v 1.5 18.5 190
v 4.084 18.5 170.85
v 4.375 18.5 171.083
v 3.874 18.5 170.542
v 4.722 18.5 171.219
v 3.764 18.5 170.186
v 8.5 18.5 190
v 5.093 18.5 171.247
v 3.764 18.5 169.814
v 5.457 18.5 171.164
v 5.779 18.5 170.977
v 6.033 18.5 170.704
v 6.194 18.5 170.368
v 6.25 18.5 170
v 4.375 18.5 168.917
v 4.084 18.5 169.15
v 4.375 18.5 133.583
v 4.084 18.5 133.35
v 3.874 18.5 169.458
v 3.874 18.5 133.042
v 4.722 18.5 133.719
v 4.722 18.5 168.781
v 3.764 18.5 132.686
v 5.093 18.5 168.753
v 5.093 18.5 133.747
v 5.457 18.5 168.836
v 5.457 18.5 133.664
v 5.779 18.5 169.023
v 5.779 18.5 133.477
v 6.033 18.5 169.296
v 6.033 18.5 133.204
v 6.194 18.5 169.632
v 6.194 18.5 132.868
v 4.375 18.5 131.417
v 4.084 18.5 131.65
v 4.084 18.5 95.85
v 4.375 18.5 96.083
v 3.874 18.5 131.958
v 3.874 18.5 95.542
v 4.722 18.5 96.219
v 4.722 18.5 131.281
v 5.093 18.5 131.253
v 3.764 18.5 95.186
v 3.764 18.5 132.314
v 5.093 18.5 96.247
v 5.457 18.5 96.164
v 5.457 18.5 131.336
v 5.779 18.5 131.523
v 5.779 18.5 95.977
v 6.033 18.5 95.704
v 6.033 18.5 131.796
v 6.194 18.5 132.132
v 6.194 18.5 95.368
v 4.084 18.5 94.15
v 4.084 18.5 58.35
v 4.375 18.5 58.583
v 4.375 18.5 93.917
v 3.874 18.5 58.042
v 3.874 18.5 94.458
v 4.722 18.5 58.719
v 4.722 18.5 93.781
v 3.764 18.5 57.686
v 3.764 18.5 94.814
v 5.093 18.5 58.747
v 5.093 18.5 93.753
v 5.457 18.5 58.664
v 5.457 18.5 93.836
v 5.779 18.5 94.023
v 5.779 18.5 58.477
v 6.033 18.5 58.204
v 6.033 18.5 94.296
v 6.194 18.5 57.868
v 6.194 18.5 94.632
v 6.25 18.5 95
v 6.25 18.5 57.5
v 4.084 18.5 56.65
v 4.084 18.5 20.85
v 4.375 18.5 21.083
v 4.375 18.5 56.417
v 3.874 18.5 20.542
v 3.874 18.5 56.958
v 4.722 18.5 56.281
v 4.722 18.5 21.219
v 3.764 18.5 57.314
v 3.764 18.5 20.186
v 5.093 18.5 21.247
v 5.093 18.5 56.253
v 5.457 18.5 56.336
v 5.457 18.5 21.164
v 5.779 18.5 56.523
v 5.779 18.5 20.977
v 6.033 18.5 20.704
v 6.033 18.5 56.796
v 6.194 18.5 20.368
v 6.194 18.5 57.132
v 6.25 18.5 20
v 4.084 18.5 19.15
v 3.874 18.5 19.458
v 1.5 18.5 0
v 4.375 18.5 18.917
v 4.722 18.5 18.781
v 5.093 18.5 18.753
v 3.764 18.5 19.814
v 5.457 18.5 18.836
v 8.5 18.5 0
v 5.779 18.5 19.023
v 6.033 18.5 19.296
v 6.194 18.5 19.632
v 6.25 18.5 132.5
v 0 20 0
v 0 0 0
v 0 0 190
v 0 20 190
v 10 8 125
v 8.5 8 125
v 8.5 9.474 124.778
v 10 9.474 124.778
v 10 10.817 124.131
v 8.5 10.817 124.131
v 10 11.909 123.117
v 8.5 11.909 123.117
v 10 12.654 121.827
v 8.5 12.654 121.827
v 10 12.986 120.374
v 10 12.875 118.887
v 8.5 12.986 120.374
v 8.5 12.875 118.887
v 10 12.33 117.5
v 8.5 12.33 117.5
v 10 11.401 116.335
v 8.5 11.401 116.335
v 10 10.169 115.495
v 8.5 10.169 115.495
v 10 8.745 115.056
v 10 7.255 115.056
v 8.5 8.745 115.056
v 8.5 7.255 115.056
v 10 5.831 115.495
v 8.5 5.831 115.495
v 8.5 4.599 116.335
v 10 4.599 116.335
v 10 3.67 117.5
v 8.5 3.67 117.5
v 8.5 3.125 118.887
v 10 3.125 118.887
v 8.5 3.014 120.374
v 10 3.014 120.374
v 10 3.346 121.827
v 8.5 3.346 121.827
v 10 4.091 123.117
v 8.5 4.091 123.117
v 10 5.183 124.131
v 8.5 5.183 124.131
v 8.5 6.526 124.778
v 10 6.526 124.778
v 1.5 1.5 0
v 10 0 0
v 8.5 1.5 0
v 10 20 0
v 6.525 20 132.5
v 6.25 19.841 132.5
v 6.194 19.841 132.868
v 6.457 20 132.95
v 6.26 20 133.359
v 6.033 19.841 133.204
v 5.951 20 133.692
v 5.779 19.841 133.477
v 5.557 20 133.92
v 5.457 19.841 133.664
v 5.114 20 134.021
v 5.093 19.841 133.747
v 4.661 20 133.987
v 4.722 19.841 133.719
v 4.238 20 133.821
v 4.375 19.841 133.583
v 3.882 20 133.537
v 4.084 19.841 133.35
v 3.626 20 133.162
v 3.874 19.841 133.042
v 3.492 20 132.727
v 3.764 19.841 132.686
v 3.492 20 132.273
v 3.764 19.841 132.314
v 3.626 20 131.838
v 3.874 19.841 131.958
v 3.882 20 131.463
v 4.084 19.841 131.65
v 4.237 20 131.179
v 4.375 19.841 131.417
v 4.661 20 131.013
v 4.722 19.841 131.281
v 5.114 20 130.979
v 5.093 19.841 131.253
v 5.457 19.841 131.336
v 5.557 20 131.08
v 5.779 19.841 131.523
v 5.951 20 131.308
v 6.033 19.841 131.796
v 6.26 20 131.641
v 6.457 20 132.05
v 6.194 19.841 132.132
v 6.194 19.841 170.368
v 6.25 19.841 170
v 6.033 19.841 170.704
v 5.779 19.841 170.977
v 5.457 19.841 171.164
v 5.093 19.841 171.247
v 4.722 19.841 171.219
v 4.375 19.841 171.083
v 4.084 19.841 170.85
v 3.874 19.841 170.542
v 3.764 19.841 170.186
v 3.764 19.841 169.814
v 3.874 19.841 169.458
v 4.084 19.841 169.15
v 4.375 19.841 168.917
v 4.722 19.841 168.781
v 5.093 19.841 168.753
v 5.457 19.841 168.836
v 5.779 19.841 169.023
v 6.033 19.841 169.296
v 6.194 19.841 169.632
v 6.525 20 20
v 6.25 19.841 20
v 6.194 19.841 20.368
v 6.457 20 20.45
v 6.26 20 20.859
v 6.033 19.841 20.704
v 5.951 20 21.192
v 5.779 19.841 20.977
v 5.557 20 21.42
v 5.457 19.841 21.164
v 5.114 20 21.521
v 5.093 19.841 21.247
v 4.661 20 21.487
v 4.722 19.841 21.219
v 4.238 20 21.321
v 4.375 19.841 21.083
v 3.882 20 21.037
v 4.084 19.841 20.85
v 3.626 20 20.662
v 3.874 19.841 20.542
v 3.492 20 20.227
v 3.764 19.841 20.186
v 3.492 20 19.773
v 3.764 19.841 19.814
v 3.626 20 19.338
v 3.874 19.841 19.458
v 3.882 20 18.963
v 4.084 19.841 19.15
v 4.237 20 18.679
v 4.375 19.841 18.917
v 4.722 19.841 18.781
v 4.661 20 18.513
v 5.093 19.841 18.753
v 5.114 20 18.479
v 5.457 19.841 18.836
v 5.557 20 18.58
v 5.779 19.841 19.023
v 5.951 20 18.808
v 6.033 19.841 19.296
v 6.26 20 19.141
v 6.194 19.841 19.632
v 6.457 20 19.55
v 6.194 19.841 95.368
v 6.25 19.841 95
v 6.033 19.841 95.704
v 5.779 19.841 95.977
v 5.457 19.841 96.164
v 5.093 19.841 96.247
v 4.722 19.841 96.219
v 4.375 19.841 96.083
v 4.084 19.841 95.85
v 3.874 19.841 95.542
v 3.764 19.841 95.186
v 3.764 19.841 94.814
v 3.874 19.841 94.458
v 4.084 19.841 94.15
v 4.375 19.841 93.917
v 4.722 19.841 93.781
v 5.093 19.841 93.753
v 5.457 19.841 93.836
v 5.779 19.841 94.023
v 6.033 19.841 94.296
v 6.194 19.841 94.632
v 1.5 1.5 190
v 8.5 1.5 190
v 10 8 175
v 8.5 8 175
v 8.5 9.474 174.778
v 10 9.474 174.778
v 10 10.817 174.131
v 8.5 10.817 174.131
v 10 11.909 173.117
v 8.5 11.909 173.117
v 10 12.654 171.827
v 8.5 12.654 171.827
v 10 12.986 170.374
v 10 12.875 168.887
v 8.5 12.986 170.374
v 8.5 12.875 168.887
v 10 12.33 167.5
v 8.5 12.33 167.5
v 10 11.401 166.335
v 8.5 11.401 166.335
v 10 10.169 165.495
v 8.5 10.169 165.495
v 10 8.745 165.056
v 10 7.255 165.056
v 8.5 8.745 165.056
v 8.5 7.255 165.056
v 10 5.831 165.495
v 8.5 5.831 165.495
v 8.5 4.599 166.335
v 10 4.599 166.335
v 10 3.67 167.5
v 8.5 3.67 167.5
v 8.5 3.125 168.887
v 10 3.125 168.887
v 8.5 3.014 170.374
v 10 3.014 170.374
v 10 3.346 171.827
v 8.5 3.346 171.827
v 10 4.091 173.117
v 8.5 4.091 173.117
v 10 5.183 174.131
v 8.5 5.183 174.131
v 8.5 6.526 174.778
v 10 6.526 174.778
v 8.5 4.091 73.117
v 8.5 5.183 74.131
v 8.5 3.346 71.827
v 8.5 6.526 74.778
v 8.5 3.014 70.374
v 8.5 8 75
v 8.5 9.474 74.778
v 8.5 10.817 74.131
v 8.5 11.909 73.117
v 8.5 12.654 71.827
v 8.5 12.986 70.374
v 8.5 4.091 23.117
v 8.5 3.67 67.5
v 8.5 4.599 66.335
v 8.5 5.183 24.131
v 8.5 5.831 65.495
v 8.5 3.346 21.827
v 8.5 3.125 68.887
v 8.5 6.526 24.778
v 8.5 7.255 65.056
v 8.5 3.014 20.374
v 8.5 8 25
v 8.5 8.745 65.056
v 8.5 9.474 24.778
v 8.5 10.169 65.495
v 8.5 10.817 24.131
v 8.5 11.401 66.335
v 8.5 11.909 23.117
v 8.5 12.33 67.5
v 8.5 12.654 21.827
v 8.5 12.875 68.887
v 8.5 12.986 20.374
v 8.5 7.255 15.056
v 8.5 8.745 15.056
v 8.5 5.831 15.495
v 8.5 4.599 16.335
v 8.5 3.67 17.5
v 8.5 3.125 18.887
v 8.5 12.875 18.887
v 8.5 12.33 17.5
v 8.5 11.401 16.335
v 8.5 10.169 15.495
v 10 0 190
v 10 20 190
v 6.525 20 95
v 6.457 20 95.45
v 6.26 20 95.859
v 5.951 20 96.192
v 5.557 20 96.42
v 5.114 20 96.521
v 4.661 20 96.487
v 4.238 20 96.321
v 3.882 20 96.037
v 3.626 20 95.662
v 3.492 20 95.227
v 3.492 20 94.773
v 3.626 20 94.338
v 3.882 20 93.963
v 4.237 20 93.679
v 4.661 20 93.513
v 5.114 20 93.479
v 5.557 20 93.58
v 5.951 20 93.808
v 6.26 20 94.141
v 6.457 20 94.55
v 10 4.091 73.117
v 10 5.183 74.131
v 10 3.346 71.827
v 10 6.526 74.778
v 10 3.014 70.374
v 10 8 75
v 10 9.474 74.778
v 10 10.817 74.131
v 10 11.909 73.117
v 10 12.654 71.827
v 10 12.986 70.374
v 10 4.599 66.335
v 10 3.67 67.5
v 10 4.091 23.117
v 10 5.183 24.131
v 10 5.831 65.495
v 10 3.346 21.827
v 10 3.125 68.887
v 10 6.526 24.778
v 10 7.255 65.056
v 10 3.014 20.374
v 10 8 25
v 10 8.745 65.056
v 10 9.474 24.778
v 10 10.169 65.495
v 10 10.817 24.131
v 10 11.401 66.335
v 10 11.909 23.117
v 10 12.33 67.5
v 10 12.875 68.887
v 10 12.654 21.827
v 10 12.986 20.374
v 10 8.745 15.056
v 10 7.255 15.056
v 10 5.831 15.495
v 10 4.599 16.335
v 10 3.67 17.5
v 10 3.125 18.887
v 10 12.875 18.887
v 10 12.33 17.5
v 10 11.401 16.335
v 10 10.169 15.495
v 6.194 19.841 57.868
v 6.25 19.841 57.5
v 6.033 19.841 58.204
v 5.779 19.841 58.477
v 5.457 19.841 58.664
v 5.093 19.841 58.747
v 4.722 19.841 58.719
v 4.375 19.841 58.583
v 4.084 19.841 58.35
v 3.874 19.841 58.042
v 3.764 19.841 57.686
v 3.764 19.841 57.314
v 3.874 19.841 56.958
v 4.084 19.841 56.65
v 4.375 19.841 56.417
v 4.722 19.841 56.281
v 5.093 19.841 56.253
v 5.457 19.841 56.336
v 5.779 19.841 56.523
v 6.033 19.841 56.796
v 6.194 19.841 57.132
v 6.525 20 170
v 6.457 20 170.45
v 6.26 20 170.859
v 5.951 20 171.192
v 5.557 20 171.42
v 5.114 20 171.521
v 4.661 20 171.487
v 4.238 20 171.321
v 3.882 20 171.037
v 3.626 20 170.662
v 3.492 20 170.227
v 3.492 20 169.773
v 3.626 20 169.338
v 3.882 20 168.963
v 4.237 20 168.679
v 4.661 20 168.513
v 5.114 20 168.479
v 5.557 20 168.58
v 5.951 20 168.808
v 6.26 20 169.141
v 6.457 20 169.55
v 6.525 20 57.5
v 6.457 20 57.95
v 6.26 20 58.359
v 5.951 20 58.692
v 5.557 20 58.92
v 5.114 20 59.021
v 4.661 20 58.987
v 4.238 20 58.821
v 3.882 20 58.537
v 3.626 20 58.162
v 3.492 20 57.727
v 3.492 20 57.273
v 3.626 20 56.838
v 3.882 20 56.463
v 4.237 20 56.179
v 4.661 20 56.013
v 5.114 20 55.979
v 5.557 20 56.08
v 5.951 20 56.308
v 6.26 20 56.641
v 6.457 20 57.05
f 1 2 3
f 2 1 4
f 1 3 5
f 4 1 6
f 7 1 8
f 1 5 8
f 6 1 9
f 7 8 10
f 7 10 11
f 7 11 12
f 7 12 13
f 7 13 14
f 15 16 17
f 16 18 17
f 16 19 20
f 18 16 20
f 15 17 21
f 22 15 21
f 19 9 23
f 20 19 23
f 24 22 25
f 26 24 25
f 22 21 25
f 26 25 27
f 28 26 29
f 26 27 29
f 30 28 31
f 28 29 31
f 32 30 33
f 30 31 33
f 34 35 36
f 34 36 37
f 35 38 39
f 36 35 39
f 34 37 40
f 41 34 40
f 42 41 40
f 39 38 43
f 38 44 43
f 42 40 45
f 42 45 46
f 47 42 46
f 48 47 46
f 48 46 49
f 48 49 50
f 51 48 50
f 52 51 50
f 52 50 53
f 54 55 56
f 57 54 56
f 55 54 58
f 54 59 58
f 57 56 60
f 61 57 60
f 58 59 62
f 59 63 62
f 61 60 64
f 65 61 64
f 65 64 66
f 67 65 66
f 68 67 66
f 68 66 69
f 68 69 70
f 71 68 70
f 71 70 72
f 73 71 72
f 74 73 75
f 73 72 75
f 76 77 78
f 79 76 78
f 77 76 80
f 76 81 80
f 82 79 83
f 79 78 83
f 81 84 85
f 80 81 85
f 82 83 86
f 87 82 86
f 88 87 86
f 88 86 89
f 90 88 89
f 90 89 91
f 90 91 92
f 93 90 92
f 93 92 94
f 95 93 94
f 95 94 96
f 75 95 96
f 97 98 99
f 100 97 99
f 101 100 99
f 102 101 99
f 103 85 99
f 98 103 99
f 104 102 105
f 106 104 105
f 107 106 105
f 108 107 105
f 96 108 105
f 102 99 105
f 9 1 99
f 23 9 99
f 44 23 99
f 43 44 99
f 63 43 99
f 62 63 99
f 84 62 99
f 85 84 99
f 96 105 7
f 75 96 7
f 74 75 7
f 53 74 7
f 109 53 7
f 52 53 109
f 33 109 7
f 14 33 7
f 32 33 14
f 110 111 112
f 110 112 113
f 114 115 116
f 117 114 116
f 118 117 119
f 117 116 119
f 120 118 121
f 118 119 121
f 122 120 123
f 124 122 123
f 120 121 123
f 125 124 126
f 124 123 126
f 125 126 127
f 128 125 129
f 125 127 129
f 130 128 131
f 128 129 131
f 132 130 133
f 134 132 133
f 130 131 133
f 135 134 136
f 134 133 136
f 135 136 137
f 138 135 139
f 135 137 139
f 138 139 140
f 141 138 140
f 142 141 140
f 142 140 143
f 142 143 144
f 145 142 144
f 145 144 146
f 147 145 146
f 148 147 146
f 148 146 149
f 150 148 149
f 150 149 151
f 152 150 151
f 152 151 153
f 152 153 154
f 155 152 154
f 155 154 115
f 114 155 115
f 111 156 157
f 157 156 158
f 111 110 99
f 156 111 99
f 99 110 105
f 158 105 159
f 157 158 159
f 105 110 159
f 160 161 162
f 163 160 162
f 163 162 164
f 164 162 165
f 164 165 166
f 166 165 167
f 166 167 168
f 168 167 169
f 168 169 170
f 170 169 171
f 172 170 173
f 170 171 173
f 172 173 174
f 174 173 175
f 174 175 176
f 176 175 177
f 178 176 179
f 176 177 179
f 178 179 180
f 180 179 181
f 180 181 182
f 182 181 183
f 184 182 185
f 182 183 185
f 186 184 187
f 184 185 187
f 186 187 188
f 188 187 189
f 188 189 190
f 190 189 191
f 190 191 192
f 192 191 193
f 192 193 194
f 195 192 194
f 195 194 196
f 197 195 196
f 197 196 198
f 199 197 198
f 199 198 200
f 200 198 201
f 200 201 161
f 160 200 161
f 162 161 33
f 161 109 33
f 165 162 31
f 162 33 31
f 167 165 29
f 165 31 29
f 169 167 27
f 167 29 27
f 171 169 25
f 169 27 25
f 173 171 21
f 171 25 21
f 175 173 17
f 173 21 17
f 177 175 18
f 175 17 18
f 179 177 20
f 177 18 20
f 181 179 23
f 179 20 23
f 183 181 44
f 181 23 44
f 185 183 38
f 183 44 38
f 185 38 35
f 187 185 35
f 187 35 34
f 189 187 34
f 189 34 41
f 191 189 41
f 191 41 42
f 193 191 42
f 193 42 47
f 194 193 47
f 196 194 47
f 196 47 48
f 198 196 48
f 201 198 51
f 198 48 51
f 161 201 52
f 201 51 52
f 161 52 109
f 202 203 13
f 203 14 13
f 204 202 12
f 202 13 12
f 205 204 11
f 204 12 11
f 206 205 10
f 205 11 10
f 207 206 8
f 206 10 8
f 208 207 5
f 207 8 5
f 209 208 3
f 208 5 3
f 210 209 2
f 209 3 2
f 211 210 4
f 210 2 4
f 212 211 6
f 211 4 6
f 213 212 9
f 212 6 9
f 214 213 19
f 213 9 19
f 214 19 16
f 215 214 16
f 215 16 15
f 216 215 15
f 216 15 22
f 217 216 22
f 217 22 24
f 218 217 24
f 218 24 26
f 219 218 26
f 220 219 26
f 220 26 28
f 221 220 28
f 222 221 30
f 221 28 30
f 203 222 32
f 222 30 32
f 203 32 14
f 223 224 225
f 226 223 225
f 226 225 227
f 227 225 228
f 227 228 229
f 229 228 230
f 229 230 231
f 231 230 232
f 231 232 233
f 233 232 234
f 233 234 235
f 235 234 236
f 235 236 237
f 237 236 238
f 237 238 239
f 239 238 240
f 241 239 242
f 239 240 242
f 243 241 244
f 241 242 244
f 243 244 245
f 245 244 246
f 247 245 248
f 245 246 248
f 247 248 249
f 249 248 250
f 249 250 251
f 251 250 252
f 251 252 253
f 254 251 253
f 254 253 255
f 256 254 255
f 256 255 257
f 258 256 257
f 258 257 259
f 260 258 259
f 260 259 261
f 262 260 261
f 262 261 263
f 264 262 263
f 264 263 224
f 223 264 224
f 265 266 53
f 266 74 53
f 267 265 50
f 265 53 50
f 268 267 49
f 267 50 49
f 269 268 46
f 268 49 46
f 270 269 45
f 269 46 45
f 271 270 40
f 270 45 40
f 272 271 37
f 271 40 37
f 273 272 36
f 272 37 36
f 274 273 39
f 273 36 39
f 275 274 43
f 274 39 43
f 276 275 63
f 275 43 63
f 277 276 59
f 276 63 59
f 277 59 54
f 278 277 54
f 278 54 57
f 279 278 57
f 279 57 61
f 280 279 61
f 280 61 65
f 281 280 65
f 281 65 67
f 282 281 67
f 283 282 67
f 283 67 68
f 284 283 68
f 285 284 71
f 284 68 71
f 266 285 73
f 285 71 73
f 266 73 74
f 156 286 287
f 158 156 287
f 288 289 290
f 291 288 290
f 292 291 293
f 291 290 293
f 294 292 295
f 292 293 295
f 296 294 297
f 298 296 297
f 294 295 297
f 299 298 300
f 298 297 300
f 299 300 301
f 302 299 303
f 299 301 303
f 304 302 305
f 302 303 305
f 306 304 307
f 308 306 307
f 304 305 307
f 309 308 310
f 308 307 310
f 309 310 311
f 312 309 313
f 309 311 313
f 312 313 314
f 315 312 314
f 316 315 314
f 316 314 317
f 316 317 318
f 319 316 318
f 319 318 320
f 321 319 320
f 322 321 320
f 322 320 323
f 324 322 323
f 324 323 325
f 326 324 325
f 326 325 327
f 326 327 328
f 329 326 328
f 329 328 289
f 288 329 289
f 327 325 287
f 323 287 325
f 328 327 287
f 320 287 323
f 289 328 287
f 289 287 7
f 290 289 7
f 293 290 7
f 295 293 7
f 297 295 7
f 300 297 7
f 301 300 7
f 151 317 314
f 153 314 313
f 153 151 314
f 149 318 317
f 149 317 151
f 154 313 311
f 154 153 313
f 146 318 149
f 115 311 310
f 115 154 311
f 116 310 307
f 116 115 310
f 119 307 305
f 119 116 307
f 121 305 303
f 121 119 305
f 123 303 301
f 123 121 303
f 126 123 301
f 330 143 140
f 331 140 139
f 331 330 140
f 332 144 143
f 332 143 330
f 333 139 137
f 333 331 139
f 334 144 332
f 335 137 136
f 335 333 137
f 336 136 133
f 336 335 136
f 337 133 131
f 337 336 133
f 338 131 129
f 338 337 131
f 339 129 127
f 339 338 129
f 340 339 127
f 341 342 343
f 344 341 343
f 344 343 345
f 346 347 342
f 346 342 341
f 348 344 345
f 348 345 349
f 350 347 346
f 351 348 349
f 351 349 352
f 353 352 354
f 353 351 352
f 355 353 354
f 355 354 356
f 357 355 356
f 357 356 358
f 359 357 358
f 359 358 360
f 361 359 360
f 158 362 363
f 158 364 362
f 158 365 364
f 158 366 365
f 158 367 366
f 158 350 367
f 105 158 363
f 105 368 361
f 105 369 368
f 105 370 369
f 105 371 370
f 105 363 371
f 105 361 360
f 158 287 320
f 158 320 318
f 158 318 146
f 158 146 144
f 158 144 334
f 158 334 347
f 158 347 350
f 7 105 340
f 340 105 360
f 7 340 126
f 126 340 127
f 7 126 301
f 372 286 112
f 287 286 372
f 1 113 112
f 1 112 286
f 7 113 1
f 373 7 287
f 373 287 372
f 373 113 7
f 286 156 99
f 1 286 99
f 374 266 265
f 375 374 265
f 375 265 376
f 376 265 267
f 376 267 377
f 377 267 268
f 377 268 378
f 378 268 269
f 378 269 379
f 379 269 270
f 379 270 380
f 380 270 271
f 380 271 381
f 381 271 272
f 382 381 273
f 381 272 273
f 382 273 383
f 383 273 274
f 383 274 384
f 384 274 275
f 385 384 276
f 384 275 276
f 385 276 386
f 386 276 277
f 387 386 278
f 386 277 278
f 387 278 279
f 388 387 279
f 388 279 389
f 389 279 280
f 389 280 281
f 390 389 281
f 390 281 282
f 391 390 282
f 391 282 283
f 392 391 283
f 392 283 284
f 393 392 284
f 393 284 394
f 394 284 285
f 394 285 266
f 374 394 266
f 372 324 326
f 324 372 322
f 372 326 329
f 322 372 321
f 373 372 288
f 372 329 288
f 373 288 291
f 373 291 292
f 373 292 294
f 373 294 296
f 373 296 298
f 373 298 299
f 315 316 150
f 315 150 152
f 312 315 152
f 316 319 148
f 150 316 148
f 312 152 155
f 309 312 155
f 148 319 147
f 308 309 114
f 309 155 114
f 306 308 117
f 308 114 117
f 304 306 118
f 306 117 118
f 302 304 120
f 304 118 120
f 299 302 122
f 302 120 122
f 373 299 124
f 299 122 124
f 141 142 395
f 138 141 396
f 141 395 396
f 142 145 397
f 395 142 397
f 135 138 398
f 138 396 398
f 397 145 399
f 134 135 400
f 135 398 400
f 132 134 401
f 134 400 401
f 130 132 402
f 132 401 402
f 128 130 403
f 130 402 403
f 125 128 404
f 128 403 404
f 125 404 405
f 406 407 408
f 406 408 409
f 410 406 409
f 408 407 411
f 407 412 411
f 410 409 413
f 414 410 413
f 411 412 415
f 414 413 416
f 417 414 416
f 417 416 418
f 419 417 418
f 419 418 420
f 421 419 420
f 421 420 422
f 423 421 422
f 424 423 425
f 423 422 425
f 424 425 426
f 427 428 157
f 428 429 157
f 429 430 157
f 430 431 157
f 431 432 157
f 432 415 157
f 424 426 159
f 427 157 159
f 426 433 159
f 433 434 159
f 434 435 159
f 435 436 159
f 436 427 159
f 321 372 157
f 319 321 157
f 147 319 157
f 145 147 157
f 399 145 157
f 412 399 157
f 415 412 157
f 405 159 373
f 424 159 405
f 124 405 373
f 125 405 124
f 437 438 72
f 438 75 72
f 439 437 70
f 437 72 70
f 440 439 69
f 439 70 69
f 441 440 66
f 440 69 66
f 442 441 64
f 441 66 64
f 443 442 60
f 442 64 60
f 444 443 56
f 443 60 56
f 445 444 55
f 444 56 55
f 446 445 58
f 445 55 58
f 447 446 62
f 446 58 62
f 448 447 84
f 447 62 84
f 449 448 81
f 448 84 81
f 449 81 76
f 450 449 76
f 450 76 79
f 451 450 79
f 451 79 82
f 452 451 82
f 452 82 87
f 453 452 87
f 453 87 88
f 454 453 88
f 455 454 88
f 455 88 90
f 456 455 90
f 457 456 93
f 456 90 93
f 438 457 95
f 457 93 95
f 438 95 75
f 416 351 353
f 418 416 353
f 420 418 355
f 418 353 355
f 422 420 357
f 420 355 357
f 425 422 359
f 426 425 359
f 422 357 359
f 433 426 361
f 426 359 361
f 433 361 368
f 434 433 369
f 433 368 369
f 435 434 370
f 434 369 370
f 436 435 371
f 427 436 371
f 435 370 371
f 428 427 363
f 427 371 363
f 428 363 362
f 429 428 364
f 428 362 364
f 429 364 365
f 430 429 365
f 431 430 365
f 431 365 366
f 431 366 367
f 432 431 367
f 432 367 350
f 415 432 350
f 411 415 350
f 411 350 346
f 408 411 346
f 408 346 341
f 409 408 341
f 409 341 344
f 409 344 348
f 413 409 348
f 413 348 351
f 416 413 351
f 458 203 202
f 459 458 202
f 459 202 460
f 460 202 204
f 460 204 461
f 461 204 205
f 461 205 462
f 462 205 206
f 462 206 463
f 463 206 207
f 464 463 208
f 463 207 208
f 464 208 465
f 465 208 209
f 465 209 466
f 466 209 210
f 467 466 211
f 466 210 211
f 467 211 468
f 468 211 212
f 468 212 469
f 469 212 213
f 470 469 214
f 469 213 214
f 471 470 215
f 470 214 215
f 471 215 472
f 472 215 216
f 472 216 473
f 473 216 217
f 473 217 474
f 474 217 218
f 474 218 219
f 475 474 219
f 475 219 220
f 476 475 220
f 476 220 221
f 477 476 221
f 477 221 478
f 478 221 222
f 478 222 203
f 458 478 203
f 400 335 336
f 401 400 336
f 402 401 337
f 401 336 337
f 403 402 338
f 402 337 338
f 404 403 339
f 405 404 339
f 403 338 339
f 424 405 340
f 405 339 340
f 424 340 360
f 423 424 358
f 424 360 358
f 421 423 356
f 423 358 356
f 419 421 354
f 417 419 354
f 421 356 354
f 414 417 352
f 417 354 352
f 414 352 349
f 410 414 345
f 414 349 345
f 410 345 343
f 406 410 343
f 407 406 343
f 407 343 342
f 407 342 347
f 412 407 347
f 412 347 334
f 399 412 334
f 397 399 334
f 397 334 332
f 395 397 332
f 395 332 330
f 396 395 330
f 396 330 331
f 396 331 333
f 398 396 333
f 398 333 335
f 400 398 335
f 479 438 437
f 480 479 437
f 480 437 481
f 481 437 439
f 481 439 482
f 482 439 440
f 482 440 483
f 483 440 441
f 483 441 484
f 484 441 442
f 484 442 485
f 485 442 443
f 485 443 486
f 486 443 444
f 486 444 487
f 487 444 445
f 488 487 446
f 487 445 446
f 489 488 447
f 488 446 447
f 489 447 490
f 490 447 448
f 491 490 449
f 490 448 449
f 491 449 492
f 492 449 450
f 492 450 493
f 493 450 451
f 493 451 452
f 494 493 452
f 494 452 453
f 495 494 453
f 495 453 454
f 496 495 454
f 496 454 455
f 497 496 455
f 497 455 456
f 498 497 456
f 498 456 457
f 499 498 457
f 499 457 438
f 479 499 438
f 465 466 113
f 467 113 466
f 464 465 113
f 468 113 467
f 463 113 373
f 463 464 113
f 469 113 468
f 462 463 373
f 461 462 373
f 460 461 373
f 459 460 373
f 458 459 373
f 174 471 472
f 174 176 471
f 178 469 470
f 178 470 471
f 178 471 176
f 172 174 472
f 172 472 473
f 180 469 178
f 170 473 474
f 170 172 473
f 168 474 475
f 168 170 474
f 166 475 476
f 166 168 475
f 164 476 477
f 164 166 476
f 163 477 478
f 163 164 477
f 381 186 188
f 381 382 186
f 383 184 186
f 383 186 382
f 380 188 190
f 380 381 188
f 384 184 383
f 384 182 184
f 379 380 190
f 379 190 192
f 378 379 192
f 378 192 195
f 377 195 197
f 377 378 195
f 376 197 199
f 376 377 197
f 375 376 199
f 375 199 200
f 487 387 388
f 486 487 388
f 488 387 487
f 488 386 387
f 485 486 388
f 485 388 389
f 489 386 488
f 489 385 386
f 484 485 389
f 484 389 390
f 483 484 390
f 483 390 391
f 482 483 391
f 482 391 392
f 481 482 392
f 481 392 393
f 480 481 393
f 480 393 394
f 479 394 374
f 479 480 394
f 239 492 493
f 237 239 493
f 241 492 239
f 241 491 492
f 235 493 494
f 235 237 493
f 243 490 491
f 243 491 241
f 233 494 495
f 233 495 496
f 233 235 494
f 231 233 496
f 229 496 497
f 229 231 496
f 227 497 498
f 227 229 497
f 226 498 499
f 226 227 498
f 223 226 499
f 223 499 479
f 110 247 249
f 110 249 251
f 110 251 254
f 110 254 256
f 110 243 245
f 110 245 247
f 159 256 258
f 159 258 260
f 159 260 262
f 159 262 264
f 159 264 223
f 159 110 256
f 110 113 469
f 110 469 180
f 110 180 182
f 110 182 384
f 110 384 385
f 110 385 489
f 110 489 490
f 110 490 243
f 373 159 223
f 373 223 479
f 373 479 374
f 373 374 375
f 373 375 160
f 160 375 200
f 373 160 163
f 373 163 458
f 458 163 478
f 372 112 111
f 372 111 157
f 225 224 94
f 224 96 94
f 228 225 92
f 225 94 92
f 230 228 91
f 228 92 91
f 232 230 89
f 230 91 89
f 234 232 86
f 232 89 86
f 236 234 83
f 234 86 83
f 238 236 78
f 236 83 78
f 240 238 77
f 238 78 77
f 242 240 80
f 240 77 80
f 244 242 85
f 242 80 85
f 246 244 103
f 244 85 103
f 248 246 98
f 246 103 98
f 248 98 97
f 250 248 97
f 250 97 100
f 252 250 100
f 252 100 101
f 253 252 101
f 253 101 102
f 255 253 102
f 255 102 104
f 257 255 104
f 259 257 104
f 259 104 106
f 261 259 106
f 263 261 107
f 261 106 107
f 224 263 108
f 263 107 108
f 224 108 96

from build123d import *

# Parameters (mm, degrees)
SKETCH_1_W                  = 10
SKETCH_1_H                  = 20
SKETCH_1_W_2                = 7
SKETCH_1_H_2                = 17
EXTRUDE_1_DEPTH             = 190
HOLE_WIZARD_M31_D           = 2.5
HOLE_WIZARD_M31_DEPTH       = 8.5
HOLE_WIZARD_M31_CSINK_D     = 3.05
HOLE_WIZARD_M31_CSINK_ANGLE = 120
HOLE_WIZARD_M31_TIP         = 0.751075774
HOLE_WIZARD_2_D             = 10
HOLE_WIZARD_2_DEPTH         = 3


with BuildPart() as part:
    # Эскиз1 → Вытянуть-Тонкостенный1 (new body)
    with BuildSketch(Plane.XY):
        with Locations((5, 10)):
            Rectangle(SKETCH_1_W, SKETCH_1_H)
        with Locations((5, 10)):
            Rectangle(SKETCH_1_W_2, SKETCH_1_H_2, mode=Mode.SUBTRACT)
    extrude(amount=EXTRUDE_1_DEPTH)

    # Отверстие обработанное метчиком M31
    with Locations(Plane(origin=(0, 20, 0), x_dir=(-1, 0, 0), z_dir=(0, 1, 0))):
        with Locations((-5, 20), (-5, 57.5), (-5, 95), (-5, 132.5), (-5, 170)):
            CounterSinkHole(HOLE_WIZARD_M31_D / 2, HOLE_WIZARD_M31_CSINK_D / 2, depth=HOLE_WIZARD_M31_DEPTH, counter_sink_angle=HOLE_WIZARD_M31_CSINK_ANGLE)
            with Locations((0, 0, -(HOLE_WIZARD_M31_DEPTH + HOLE_WIZARD_M31_TIP / 2))):  # 118° drill point
                Cone(0, HOLE_WIZARD_M31_D / 2, HOLE_WIZARD_M31_TIP, mode=Mode.SUBTRACT)

    # Отверстие2
    with Locations(Plane(origin=(10, 0, 0), x_dir=(0, 0, -1), z_dir=(1, 0, 0))):
        with Locations((-170, 8), (-120, 8), (-70, 8), (-20, 8)):
            Hole(HOLE_WIZARD_2_D / 2, depth=HOLE_WIZARD_2_DEPTH)


solid = part.part
